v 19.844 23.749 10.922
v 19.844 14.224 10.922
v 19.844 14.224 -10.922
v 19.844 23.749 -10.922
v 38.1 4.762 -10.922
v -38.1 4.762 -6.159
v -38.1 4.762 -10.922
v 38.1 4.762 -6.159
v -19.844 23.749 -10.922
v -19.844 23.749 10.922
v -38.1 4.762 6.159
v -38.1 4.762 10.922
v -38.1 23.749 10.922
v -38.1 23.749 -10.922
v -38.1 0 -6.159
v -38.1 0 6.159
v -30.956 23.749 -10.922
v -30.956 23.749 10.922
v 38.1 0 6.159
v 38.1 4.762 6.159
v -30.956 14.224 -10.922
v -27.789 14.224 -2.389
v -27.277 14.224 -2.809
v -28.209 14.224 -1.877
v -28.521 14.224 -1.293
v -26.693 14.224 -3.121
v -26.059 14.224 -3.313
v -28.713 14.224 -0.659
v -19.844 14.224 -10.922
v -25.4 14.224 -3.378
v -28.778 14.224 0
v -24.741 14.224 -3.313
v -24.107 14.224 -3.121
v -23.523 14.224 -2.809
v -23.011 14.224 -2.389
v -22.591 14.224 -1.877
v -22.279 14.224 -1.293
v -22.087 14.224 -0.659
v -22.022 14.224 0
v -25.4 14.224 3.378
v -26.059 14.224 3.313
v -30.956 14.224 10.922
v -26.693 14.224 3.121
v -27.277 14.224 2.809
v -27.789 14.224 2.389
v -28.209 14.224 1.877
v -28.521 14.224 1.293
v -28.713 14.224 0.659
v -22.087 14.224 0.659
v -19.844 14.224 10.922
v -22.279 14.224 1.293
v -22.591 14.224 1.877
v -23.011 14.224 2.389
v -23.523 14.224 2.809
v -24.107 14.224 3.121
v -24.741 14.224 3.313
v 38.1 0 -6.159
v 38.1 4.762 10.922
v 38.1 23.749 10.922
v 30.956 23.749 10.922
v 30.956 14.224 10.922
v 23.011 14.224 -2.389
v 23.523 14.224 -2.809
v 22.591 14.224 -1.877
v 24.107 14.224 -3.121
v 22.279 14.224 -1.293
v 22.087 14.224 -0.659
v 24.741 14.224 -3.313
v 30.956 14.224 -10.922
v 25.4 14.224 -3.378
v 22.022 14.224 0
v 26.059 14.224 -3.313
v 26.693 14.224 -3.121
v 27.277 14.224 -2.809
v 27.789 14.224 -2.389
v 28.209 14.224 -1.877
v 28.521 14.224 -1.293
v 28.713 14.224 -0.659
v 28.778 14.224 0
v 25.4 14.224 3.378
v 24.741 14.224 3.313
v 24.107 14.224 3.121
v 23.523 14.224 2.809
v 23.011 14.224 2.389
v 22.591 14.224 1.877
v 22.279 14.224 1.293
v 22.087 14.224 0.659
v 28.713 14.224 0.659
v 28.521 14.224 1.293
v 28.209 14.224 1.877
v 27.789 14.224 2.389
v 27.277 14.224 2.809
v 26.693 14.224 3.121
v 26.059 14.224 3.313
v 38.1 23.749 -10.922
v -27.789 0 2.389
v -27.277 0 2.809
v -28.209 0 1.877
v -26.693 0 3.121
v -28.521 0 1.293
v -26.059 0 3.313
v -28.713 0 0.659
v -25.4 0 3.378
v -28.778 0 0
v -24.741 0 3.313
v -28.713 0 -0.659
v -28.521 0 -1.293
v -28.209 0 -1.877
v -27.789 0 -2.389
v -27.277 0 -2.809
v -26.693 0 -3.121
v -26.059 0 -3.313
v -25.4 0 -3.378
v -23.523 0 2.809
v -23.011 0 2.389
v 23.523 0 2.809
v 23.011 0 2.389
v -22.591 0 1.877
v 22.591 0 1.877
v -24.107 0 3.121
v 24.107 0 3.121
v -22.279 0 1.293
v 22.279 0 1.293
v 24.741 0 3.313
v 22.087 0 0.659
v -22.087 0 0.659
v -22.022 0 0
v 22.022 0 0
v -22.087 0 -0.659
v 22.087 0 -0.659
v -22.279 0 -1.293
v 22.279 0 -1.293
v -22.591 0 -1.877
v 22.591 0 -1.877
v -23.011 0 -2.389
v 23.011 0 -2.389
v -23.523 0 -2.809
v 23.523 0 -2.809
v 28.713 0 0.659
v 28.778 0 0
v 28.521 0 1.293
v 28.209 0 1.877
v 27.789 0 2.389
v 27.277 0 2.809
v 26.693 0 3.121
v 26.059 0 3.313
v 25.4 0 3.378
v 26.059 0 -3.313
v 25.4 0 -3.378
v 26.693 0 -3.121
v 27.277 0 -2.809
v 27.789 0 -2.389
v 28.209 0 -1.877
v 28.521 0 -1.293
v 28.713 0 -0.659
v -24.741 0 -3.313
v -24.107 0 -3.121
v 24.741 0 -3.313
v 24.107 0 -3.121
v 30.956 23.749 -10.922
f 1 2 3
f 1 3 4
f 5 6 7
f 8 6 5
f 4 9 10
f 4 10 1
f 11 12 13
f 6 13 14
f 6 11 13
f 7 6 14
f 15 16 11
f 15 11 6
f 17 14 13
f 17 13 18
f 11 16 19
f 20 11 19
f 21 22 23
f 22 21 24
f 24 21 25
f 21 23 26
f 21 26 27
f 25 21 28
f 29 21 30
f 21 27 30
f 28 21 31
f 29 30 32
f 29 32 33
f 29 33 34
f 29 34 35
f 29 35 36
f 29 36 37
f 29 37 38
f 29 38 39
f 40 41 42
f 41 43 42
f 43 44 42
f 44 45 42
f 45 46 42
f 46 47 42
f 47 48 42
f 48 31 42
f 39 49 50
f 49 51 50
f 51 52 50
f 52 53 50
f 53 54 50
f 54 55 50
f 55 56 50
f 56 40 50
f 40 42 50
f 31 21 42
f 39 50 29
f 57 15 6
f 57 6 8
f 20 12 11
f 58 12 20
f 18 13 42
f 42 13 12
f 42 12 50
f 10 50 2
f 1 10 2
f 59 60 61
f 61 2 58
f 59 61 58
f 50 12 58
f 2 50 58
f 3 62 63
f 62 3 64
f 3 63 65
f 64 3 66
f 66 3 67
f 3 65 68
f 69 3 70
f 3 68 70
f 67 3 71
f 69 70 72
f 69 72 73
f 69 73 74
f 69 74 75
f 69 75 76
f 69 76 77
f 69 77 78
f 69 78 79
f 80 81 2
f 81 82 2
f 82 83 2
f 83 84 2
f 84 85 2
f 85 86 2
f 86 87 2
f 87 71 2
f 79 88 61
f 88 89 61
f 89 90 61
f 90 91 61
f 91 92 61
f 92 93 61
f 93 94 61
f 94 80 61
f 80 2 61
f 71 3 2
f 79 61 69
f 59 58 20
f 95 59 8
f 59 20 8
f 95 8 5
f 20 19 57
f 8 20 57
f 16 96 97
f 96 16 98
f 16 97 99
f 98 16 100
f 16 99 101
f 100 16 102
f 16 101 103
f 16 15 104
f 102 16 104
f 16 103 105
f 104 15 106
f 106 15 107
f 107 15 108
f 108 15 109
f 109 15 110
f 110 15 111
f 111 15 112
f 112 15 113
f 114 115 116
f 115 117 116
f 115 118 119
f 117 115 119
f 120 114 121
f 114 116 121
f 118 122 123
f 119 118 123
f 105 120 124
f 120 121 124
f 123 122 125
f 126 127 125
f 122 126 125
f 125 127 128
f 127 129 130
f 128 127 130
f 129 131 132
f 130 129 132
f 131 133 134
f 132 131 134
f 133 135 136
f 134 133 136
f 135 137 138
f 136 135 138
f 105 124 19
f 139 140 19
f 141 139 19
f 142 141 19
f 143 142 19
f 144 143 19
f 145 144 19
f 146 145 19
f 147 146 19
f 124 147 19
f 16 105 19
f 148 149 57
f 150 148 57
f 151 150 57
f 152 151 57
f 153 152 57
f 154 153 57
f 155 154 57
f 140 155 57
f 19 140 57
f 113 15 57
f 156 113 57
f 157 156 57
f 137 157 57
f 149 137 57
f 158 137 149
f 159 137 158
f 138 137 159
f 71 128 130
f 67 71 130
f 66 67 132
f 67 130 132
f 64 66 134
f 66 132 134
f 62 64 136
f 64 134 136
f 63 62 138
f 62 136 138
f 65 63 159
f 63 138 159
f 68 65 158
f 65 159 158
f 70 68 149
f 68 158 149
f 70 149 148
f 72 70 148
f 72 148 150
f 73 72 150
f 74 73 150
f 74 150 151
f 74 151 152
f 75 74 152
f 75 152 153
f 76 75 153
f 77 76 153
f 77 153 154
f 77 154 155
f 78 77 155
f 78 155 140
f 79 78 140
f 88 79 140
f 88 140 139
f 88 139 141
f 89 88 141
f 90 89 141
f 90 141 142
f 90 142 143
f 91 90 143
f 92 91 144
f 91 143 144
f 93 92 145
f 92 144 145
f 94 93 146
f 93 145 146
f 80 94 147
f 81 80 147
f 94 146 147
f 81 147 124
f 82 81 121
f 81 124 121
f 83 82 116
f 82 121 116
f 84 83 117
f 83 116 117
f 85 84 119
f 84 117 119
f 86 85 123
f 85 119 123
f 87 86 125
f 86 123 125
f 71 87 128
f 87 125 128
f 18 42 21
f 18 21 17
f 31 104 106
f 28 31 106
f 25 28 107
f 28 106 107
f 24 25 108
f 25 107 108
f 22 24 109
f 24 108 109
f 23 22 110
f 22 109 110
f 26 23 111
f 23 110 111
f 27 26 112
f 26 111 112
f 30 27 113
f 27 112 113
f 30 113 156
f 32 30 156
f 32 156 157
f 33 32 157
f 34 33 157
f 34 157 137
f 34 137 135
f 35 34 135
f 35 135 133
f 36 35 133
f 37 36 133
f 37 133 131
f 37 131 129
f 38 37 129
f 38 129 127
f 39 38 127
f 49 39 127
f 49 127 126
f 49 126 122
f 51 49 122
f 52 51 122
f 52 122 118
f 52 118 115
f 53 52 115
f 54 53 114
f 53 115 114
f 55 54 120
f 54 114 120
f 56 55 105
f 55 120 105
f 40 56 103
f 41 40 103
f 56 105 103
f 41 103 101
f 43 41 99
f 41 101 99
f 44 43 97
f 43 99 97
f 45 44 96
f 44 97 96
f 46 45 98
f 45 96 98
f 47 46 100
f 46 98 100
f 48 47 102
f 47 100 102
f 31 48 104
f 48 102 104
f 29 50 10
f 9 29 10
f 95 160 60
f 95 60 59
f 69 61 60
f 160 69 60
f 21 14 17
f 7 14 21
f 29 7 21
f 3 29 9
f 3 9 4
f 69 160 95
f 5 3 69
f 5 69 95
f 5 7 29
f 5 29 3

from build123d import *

# Parameters (mm, degrees)
SKETCH1_W                            = 76.2
SKETCH1_H                            = 21.844
STOCK_DEPTH                          = 23.749
CLEARANCE_HOLES_FOR_MOUNTING_BOLTS_D = 6.7564
SKETCH5_W                            = 76.2
SKETCH5_H                            = 4.7625
CLEARANCE_RABBIT_DEPTH               = 4.7625
SKETCH6_W                            = 11.1125
SKETCH6_H                            = 9.525
CUT_EXTRUDE1_DEPTH                   = 50.927801243


with BuildPart() as part:
    # Sketch1 → Stock (new body)
    with BuildSketch(Plane(origin=(0, 0, 0), x_dir=(1, 0, 0), z_dir=(0, 1, 0))):
        Rectangle(SKETCH1_W, SKETCH1_H)
    extrude(amount=STOCK_DEPTH)

    # Clearance holes for Mounting Bolts (through all)
    with Locations(Plane(origin=(0, 23.749, 0), x_dir=(1, 0, 0), z_dir=(0, 1, 0))):
        with Locations((-25.4, 0), (25.4, 0)):
            Hole(CLEARANCE_HOLES_FOR_MOUNTING_BOLTS_D / 2)

    # Sketch5 → Clearance Rabbit (cut)
    with BuildSketch(Plane.XZ):
        with Locations((0, 8.54075)):
            Rectangle(SKETCH5_W, SKETCH5_H)
        with Locations((0, -8.54075)):
            Rectangle(SKETCH5_W, SKETCH5_H)
    extrude(amount=-CLEARANCE_RABBIT_DEPTH, mode=Mode.SUBTRACT)

    # Sketch6 → Cut-Extrude1 (cut, through all)
    with BuildSketch(Plane.XY.offset(10.922)):
        with Locations((-25.4, 18.9865)):
            Rectangle(SKETCH6_W, SKETCH6_H)
        with Locations((25.4, 18.9865)):
            Rectangle(SKETCH6_W, SKETCH6_H)
    extrude(amount=-CUT_EXTRUDE1_DEPTH, mode=Mode.SUBTRACT)


solid = part.part
